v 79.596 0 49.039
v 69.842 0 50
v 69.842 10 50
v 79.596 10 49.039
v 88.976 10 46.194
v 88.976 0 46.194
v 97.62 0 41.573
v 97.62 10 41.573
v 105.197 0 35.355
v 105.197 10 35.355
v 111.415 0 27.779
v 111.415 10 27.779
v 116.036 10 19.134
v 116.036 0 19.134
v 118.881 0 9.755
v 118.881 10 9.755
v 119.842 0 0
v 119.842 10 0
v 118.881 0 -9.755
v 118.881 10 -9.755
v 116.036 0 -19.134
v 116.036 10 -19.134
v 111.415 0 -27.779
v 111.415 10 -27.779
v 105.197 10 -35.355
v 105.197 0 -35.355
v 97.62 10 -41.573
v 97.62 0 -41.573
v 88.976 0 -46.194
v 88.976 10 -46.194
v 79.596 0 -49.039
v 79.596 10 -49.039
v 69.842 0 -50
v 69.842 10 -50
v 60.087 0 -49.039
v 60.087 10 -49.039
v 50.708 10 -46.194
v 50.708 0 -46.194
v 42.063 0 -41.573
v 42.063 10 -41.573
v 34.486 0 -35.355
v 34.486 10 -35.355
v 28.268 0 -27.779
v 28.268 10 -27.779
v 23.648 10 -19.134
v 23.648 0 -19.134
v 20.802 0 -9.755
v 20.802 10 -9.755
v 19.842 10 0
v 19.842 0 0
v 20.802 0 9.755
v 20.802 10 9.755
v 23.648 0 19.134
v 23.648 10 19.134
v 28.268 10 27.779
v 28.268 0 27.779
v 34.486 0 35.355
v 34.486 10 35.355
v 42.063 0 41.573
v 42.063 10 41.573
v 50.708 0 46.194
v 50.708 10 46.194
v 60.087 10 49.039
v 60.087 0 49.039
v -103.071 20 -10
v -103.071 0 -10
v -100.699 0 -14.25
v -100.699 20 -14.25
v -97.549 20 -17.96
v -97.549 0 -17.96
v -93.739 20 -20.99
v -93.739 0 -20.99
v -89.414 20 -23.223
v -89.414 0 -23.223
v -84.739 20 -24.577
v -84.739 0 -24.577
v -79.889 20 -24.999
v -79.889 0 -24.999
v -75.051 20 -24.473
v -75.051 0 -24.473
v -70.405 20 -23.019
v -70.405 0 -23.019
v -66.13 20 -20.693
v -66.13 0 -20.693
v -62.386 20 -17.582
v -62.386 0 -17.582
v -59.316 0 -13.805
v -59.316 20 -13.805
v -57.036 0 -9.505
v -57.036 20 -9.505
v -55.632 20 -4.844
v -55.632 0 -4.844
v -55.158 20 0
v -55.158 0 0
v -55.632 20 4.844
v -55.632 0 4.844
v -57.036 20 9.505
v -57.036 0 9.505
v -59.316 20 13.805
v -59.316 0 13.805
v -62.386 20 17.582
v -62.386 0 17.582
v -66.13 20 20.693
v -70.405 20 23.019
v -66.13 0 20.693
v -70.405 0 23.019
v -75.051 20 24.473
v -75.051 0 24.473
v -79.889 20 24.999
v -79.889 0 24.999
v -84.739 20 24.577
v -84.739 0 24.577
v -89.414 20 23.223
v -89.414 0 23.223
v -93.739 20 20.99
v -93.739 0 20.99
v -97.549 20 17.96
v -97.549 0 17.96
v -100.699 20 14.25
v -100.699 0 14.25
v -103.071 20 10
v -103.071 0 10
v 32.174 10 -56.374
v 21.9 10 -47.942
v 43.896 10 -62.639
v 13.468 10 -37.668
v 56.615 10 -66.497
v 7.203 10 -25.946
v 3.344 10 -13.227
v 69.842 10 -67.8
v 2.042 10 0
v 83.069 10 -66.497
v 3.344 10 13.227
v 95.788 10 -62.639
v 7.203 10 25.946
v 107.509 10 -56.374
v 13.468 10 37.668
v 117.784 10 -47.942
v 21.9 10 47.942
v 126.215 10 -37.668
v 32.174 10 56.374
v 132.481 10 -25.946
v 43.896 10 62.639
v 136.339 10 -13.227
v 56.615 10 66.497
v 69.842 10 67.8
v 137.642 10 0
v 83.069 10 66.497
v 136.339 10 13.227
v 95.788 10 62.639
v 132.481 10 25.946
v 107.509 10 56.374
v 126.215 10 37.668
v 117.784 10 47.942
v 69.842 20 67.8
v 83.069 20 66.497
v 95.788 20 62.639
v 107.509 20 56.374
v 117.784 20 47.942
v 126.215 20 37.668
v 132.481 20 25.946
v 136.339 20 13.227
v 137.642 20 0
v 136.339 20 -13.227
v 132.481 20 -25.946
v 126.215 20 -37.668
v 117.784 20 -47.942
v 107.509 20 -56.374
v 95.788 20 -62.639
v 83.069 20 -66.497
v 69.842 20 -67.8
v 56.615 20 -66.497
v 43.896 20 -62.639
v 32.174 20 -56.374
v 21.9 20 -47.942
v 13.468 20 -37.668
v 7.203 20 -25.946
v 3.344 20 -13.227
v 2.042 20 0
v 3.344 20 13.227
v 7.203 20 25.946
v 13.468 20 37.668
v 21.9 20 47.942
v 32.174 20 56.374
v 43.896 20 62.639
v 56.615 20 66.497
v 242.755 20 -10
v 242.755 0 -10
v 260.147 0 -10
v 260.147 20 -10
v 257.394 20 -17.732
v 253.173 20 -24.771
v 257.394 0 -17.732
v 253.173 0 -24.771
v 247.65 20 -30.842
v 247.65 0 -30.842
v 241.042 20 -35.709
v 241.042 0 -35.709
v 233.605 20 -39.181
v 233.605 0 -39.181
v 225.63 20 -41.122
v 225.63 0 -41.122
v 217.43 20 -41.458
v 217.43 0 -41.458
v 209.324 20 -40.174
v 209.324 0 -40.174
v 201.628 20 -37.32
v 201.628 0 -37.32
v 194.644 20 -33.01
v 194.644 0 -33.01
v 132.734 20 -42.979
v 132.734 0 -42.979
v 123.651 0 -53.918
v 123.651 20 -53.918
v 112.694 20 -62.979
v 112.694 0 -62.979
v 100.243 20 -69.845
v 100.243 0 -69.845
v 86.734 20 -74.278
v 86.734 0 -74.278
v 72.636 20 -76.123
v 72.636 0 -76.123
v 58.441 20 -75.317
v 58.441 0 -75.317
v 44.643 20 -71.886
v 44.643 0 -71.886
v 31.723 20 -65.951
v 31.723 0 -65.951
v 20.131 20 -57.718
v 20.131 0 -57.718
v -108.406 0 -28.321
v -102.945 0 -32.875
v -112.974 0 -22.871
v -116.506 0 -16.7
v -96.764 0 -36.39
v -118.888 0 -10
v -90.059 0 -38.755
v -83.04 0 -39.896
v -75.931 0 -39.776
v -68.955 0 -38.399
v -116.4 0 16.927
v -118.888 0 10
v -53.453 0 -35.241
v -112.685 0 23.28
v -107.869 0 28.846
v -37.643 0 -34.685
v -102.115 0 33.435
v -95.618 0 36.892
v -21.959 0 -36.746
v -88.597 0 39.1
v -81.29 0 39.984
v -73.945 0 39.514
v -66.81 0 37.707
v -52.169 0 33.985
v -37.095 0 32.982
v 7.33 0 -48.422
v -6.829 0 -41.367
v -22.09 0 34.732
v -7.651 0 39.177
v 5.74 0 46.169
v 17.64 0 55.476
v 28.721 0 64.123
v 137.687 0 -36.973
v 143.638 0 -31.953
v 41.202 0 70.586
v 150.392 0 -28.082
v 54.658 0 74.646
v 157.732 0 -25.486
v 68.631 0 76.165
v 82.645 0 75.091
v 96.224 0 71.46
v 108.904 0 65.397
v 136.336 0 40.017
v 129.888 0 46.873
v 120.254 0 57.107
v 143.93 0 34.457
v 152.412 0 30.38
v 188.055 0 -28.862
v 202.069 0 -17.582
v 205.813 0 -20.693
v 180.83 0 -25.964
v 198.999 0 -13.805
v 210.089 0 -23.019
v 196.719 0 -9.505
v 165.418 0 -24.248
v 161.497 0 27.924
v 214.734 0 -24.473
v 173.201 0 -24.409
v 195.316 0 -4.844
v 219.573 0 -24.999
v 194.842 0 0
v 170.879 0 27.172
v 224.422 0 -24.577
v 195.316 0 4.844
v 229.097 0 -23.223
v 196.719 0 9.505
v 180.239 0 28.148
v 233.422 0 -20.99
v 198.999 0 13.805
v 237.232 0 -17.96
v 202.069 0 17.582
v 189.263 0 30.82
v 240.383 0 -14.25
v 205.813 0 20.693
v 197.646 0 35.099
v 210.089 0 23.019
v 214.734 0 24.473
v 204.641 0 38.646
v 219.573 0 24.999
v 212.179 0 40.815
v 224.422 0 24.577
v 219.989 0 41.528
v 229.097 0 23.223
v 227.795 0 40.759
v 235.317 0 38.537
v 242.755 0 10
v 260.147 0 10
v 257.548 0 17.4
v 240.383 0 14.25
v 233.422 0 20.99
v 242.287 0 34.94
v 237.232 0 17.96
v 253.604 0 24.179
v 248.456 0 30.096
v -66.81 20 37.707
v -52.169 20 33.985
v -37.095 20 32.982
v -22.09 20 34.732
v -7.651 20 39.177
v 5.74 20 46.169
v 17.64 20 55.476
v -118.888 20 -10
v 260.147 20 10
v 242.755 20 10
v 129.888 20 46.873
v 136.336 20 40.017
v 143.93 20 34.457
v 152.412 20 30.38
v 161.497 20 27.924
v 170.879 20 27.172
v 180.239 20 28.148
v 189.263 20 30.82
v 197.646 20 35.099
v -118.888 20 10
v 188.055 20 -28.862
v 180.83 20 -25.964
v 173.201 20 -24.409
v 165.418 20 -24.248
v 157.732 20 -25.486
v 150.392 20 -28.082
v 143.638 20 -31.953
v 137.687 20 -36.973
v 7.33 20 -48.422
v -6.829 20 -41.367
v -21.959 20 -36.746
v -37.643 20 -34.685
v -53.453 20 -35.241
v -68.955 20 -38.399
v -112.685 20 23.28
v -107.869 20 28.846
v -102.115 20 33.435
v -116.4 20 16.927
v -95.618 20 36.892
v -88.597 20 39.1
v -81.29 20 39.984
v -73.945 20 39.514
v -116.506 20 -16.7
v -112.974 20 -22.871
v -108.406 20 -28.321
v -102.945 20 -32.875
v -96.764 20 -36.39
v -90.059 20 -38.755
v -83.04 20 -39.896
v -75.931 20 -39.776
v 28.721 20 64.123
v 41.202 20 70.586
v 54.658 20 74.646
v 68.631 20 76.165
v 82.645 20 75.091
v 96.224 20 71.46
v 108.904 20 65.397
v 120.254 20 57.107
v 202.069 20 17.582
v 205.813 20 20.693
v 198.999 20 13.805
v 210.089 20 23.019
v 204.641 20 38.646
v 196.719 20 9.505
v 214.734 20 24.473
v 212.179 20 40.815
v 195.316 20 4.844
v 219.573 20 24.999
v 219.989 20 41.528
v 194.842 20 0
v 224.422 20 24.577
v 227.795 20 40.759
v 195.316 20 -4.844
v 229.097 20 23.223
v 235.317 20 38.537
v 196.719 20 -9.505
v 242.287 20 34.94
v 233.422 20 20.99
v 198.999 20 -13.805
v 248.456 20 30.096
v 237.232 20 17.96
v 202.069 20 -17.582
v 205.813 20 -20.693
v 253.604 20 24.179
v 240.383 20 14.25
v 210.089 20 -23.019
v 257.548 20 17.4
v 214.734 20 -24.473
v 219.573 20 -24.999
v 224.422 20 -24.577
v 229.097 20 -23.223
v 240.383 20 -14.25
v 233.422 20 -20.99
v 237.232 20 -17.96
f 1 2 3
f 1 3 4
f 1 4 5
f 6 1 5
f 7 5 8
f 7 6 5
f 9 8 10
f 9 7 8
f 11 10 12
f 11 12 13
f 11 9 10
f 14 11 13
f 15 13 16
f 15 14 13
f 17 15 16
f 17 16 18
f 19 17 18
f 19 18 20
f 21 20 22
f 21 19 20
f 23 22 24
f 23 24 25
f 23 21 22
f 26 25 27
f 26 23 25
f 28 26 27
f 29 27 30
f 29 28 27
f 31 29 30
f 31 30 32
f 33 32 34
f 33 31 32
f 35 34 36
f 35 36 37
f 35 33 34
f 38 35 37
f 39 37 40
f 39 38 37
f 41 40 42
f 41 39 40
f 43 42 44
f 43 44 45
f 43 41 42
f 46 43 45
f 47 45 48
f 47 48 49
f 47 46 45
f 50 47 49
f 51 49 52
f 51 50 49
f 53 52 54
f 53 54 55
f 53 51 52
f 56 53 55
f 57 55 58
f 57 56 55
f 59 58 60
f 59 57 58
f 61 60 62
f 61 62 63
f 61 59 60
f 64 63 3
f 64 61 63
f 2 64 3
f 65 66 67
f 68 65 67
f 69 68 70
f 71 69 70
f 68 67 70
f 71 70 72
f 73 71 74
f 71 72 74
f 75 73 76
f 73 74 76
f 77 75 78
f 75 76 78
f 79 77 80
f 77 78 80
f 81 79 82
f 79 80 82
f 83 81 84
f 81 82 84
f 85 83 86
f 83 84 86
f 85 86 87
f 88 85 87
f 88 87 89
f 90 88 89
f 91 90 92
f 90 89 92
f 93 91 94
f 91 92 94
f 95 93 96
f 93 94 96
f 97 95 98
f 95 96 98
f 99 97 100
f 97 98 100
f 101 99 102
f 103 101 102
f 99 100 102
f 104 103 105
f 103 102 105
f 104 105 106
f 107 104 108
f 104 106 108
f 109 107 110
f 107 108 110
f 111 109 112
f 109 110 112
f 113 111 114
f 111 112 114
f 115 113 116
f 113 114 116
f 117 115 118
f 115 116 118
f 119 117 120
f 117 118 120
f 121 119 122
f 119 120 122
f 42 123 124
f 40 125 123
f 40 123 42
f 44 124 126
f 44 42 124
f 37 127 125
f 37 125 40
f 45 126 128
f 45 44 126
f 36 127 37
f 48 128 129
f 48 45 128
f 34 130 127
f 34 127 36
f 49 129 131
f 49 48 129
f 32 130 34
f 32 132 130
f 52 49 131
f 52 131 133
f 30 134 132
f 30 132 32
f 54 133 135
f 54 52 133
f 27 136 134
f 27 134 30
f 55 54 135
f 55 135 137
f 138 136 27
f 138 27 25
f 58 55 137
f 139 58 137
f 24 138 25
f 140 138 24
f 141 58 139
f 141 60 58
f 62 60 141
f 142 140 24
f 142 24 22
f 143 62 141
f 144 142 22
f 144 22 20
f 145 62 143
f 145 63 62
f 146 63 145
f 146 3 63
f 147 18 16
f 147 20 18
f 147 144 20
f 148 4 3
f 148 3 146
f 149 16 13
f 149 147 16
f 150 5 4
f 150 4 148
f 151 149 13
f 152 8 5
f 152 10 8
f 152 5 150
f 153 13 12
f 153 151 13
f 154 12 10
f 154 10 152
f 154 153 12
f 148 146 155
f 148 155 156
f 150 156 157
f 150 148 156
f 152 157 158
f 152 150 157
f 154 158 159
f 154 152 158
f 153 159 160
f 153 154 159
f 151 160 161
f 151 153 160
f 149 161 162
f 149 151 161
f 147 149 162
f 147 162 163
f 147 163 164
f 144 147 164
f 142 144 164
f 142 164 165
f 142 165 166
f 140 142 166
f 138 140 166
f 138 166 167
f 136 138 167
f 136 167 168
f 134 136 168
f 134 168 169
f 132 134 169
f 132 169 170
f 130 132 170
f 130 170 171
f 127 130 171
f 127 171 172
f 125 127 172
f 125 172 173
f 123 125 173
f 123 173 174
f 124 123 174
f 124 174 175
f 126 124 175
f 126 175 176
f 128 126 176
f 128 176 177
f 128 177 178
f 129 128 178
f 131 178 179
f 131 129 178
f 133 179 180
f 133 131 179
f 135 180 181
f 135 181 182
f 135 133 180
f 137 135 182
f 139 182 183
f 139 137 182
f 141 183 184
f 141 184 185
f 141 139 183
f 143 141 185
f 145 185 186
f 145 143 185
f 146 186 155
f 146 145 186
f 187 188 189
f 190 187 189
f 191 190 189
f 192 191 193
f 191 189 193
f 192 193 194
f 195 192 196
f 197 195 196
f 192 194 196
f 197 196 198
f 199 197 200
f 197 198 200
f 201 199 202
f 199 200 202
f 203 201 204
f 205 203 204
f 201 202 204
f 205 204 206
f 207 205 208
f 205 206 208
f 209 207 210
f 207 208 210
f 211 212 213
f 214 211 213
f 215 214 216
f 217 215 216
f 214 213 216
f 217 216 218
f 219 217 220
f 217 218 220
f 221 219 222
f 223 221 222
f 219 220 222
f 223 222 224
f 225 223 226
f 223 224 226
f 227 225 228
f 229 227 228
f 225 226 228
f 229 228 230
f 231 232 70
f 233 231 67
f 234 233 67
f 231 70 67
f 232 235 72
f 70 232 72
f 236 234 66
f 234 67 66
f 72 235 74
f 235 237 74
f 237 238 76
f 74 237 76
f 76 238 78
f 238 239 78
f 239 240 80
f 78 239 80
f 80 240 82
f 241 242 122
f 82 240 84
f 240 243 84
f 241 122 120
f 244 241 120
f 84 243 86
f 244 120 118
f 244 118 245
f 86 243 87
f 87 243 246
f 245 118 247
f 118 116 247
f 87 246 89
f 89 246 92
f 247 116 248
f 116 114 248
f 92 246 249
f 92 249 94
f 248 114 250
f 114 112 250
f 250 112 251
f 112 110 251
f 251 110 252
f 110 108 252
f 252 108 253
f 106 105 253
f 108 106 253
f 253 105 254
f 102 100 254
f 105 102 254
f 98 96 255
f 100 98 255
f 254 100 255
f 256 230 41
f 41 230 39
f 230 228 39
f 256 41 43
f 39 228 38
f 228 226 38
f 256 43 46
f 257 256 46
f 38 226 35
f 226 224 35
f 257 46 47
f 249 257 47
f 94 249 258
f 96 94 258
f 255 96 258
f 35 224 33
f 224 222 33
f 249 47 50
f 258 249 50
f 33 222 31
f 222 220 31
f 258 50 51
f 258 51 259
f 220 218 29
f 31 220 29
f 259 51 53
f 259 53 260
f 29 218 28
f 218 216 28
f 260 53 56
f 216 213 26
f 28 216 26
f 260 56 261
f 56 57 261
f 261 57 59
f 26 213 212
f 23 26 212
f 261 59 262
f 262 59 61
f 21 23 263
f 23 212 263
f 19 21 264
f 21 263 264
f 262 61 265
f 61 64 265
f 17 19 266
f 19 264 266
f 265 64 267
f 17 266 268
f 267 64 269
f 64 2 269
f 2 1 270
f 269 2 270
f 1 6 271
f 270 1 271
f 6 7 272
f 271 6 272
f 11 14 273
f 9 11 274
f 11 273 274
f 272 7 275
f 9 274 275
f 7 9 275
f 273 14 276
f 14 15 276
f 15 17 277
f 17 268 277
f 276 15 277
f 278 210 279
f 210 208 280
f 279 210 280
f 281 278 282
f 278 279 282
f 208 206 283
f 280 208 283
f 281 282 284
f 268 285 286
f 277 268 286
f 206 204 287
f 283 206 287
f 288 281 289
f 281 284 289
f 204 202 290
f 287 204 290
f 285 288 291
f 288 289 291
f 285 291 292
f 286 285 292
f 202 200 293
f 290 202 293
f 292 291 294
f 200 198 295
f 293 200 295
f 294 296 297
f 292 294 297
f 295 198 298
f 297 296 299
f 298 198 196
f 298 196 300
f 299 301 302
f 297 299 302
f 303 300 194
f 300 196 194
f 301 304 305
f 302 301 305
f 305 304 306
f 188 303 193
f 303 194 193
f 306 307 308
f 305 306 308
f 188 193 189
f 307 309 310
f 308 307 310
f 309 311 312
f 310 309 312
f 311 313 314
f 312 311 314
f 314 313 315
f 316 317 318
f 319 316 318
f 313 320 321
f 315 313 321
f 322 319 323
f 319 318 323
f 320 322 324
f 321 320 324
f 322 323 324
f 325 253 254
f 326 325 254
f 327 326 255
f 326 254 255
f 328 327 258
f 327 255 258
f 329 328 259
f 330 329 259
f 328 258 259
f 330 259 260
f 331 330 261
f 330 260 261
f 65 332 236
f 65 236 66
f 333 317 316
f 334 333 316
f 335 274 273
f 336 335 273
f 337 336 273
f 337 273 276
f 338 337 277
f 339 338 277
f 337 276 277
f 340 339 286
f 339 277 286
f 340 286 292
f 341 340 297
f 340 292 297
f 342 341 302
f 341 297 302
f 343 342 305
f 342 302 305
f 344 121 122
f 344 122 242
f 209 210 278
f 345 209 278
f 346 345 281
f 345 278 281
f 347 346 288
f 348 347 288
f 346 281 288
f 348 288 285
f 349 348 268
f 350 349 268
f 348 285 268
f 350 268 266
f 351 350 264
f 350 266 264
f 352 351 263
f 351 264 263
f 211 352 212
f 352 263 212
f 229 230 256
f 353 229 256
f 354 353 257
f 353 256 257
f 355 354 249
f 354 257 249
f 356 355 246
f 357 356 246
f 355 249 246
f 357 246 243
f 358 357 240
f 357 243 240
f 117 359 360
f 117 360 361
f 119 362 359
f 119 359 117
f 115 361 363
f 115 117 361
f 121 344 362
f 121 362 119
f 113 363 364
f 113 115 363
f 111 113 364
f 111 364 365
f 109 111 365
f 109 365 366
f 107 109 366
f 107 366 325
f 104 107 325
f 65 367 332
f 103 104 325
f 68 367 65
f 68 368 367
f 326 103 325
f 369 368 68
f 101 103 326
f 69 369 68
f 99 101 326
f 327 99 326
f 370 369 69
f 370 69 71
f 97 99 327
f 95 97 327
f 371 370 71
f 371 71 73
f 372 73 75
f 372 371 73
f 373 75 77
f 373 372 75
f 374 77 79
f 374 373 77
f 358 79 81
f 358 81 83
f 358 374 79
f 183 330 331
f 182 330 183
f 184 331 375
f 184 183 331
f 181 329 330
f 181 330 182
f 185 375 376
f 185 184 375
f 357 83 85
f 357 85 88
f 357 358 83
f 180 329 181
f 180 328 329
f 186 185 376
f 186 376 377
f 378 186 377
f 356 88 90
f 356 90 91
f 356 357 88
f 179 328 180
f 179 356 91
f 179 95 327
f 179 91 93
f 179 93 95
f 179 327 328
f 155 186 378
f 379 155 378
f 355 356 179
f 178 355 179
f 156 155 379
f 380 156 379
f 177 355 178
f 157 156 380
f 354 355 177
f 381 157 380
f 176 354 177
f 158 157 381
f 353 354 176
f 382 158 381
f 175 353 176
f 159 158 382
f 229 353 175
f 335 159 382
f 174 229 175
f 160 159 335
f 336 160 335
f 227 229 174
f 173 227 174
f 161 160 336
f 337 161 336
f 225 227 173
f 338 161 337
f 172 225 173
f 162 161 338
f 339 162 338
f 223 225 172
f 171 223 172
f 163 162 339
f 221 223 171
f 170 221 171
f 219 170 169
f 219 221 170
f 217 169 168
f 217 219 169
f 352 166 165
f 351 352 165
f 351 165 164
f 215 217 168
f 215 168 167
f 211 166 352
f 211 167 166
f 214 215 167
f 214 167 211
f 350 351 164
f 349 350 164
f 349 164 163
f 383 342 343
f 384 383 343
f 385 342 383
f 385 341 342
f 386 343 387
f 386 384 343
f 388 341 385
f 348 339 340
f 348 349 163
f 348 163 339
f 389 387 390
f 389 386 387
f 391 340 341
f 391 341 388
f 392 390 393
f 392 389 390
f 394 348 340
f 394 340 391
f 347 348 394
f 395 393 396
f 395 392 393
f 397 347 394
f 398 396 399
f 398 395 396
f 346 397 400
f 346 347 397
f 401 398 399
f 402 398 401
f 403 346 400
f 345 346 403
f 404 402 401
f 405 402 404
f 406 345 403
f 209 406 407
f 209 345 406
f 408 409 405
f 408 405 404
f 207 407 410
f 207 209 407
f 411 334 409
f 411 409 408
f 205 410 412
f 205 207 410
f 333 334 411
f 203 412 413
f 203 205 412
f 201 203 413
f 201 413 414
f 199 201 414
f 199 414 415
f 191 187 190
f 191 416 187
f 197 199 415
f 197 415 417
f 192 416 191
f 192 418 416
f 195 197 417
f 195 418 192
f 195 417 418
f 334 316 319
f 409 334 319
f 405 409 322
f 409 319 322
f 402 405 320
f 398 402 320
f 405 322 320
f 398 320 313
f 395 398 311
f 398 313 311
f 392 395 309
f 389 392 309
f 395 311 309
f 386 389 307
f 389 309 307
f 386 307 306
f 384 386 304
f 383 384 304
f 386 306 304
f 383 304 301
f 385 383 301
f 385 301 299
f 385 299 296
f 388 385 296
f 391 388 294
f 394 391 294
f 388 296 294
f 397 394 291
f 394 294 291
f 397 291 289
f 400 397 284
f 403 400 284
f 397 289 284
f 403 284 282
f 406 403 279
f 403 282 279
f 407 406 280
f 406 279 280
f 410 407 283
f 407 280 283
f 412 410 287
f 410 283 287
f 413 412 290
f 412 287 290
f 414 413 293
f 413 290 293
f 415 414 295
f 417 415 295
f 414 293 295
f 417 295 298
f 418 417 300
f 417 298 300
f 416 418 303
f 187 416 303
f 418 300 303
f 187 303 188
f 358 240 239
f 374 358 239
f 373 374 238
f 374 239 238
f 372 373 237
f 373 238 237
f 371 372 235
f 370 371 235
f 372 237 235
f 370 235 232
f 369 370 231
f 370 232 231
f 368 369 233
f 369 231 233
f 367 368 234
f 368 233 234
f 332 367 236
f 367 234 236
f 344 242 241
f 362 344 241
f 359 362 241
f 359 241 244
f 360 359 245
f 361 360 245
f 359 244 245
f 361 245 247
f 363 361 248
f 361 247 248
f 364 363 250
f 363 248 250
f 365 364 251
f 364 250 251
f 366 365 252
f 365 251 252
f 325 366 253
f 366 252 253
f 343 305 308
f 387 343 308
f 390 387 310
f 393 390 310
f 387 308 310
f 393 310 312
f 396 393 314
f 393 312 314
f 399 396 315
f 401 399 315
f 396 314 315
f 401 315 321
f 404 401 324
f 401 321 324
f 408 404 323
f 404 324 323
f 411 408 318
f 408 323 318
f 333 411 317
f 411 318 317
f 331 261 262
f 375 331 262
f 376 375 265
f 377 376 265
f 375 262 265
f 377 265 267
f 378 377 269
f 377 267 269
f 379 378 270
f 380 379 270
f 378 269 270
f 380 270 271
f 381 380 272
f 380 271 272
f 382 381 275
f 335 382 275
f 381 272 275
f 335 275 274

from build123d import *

# Parameters (mm, degrees)
SKETCH1_R           = 67.8
BOSS_EXTRUDE1_DEPTH = 20
SKETCH1_3_R         = 67.8
SKETCH1_3_R_2       = 50
BOSS_EXTRUDE2_DEPTH = 10


with BuildPart() as part:
    # Sketch1 → Boss-Extrude1 (new body)
    with BuildSketch(Plane(origin=(0, 0, 0), x_dir=(1, 0, 0), z_dir=(0, 1, 0))):
        with BuildLine():
            ThreePointArc((-68.95457192, 38.398915813), (-99.933181208, 34.770010311), (-118.888121928, 10))
            Line((-118.888121928, 10), (-103.07116694, 10))
            ThreePointArc((-103.07116694, 10), (-55.158288466, 0), (-103.07116694, -10))
            Line((-103.07116694, -10), (-118.888121928, -10))
            ThreePointArc((-118.888121928, -10), (-98.946037038, -35.313177478), (-66.810190141, -37.707138198))
            ThreePointArc((-66.810190141, -37.707138198), (-22.089611981, -34.732295435), (17.640354454, -55.476199781))
            ThreePointArc((17.640354454, -55.476199781), (75.663213782, -75.951962021), (129.887825017, -46.872749853))
            ThreePointArc((129.887825017, -46.872749853), (161.497288251, -27.924259237), (197.646050954, -35.098547889))
            ThreePointArc((197.646050954, -35.098547889), (235.316798867, -38.536697893), (260.147485469, -10))
            Line((260.147485469, -10), (242.754590009, -10))
            ThreePointArc((242.754590009, -10), (194.841711534, 0), (242.754590009, 10))
            Line((242.754590009, 10), (260.147485469, 10))
            ThreePointArc((260.147485469, 10), (233.604843606, 39.180755583), (194.644031062, 33.009579084))
            ThreePointArc((194.644031062, 33.009579084), (161.546937037, 24.693656308), (132.733534149, 42.979170204))
            ThreePointArc((132.733534149, 42.979170204), (79.728157262, 75.530448258), (20.130518149, 57.718174568))
            ThreePointArc((20.130518149, 57.718174568), (-21.958648504, 36.745511037), (-68.95457192, 38.398915813))
        make_face()
        with Locations((69.841711534, 0)):
            Circle(SKETCH1_R, mode=Mode.SUBTRACT)
    extrude(amount=BOSS_EXTRUDE1_DEPTH)

    # Sketch1<3> → Boss-Extrude2 (add)
    with BuildSketch(Plane(origin=(0, 0, 0), x_dir=(1, 0, 0), z_dir=(0, 1, 0))):
        with Locations((69.841711534, 0)):
            Circle(SKETCH1_3_R)
        with Locations((69.841711534, 0)):
            Circle(SKETCH1_3_R_2, mode=Mode.SUBTRACT)
    extrude(amount=BOSS_EXTRUDE2_DEPTH)


solid = part.part
